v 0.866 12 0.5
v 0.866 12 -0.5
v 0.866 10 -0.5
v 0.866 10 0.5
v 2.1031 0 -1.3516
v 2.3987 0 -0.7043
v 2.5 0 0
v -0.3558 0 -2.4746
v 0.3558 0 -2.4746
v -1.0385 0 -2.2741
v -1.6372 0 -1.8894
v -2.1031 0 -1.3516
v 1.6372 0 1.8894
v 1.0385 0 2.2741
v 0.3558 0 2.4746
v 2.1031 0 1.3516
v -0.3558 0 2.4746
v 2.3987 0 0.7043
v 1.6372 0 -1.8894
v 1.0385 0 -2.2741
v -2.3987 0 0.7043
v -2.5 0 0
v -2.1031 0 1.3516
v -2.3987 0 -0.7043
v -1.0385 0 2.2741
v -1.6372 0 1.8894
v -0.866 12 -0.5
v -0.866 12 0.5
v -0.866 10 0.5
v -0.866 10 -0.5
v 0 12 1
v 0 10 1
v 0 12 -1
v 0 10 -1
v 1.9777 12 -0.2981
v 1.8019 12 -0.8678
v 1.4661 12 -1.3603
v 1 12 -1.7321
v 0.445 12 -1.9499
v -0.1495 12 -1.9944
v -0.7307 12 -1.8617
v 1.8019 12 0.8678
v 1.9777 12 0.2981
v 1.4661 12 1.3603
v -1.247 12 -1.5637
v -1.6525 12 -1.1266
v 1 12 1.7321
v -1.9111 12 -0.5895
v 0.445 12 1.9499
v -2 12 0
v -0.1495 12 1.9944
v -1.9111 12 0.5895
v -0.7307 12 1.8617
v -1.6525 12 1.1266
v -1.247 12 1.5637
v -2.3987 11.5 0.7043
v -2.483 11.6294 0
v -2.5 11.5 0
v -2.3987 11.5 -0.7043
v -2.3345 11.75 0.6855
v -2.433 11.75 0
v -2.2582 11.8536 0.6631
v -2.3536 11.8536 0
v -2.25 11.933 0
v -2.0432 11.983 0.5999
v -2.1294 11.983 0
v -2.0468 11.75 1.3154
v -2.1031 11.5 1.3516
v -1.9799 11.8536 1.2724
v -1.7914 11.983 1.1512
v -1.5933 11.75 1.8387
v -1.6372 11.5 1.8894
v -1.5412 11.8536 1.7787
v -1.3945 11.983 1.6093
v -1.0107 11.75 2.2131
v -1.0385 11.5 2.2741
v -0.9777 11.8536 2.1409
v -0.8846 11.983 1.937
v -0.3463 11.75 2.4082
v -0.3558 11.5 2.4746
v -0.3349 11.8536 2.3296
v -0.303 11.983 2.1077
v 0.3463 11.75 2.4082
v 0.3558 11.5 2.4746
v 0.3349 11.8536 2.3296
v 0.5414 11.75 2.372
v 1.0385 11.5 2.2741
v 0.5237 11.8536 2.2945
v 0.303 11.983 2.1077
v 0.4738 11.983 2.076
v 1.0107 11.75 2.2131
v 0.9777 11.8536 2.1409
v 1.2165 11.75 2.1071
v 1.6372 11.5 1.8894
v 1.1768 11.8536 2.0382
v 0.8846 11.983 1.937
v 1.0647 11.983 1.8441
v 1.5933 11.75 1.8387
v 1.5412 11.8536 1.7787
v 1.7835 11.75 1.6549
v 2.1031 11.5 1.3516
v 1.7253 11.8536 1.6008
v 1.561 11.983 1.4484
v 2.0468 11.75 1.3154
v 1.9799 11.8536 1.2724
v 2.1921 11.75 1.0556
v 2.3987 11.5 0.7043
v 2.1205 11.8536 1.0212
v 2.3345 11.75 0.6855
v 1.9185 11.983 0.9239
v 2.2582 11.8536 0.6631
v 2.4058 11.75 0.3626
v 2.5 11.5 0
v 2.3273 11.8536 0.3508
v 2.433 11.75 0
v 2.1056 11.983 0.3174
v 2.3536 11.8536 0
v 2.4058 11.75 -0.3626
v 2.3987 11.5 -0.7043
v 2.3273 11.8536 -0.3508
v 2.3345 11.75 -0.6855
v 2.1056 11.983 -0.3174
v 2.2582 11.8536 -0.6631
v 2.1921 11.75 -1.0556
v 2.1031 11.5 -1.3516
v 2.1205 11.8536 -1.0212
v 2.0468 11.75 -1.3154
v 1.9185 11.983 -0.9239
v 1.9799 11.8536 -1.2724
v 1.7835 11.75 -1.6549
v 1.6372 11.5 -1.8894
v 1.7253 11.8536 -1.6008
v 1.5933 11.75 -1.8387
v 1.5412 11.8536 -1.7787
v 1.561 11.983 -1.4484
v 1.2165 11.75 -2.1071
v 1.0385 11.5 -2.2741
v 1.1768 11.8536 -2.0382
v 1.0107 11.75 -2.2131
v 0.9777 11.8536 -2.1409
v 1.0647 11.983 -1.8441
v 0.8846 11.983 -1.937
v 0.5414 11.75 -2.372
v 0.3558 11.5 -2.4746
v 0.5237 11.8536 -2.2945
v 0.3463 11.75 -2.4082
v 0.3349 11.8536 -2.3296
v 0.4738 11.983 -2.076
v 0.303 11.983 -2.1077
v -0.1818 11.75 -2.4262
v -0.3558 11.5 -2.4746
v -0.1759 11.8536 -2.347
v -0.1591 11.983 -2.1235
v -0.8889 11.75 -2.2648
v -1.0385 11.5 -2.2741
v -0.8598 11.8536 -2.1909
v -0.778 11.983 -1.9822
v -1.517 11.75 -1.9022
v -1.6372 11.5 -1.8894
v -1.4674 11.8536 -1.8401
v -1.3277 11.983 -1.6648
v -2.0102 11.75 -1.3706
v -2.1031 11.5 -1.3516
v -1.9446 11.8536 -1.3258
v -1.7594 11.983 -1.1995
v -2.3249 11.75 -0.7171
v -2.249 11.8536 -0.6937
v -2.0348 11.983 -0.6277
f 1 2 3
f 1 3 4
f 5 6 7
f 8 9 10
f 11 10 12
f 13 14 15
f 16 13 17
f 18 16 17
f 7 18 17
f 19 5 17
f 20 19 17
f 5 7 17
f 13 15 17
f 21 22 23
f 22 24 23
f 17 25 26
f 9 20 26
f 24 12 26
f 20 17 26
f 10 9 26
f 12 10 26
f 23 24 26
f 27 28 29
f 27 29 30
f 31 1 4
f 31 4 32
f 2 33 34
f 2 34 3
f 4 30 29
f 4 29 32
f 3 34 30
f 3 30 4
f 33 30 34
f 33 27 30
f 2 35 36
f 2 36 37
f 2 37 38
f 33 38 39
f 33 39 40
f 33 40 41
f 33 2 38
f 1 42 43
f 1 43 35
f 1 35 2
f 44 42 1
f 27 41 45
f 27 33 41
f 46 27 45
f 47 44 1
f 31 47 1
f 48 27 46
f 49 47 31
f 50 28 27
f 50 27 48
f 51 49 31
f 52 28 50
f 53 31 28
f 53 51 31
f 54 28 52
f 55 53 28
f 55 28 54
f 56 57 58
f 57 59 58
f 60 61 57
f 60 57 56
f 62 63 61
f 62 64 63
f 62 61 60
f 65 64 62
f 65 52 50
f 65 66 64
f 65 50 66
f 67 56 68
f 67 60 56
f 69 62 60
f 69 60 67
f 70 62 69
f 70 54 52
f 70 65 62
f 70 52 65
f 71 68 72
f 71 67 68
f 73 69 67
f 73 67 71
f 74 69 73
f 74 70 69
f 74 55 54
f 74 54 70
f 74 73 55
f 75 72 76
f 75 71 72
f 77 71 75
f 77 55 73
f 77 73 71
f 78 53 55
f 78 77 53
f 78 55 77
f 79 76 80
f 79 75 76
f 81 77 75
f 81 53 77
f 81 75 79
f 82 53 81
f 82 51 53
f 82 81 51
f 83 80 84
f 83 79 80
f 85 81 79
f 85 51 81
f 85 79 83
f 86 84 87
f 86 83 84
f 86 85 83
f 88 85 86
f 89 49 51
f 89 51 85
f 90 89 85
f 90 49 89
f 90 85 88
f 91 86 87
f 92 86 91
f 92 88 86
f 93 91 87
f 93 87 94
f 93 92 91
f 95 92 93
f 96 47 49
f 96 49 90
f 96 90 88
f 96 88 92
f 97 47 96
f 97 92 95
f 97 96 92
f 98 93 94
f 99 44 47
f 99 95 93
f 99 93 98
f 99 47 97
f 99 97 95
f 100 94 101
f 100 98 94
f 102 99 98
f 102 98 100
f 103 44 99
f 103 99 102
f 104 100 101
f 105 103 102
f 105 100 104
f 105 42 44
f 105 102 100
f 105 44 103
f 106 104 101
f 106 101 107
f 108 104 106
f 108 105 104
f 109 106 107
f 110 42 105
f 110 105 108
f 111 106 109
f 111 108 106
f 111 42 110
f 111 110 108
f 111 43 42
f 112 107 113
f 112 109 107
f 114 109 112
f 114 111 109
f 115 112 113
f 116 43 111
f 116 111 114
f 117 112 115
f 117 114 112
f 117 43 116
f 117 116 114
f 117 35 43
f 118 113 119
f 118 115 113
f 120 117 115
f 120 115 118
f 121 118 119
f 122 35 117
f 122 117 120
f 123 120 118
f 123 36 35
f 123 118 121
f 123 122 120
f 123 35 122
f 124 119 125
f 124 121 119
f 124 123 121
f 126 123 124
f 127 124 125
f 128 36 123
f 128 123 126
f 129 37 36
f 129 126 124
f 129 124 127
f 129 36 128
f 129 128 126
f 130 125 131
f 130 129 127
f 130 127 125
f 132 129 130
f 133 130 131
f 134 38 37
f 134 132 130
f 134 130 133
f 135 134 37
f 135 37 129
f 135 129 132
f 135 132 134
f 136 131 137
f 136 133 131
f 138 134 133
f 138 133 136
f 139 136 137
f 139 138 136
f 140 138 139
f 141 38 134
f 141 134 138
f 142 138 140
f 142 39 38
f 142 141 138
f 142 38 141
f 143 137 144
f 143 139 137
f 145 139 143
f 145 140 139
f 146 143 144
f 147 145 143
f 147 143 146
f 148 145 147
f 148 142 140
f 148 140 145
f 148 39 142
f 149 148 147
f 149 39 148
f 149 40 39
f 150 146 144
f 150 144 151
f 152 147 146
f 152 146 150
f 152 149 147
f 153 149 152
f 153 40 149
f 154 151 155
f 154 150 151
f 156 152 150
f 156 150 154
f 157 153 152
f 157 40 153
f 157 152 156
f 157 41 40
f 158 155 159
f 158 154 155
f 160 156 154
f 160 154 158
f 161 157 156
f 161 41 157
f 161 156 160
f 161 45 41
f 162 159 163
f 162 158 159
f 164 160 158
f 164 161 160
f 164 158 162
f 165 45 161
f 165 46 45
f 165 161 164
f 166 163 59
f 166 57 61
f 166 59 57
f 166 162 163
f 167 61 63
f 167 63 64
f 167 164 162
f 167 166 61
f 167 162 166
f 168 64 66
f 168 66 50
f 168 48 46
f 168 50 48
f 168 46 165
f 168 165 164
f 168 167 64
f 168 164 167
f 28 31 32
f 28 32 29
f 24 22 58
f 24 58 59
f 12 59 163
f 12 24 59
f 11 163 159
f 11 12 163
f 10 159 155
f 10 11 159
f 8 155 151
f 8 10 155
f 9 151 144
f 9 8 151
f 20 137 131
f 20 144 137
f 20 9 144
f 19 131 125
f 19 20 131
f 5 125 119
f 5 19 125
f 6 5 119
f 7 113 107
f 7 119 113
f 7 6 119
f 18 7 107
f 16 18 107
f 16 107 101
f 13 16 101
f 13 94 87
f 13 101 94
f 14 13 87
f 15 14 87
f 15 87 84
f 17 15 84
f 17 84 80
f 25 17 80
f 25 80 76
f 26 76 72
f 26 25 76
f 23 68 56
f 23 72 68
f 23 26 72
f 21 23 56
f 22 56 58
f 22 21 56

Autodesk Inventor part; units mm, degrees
ref_plane "YZ Plane" through (0, 0, 0) normal (1, 0, 0) x (0, 1, 0)
ref_plane "XZ Plane" through (0, 0, 0) normal (0, 1, 0) x (-1, 0, 0)
ref_plane "XY Plane" through (0, 0, 0) normal (0, 0, 1) x (1, 0, 0)
sketch "Sketch1" plane through (0, 0, 0) normal (0, 1, 0) x (-1, 0, 0)
  circle A0 centre (0, 0) radius 2.5
  dimension "d0" = 5
extrude "Extrusion1" add sketch "Sketch1" along normal blind 12
fillet "Fillet1" radius 0.5 1 edges at (2.5, 12, 0)
sketch "Sketch2" plane through (0, 12, 0) normal (0, 1, 0) x (1, 0, 0)
  line L0 (0, 1) -> (0.866, 0.5)
  line L1 (0.866, 0.5) -> (0.866, -0.5)
  line L2 (0.866, -0.5) -> (0, -1)
  line L3 (0, -1) -> (-0.866, -0.5)
  line L4 (-0.866, -0.5) -> (-0.866, 0.5)
  line L5 (-0.866, 0.5) -> (0, 1)
  point P0 (0, 0)
  point P1 (0, 0)
  dimension "d4" = 1
extrude "Extrusion2" cut sketch "Sketch2" against normal blind 2
properties part number "5mm Screw"
